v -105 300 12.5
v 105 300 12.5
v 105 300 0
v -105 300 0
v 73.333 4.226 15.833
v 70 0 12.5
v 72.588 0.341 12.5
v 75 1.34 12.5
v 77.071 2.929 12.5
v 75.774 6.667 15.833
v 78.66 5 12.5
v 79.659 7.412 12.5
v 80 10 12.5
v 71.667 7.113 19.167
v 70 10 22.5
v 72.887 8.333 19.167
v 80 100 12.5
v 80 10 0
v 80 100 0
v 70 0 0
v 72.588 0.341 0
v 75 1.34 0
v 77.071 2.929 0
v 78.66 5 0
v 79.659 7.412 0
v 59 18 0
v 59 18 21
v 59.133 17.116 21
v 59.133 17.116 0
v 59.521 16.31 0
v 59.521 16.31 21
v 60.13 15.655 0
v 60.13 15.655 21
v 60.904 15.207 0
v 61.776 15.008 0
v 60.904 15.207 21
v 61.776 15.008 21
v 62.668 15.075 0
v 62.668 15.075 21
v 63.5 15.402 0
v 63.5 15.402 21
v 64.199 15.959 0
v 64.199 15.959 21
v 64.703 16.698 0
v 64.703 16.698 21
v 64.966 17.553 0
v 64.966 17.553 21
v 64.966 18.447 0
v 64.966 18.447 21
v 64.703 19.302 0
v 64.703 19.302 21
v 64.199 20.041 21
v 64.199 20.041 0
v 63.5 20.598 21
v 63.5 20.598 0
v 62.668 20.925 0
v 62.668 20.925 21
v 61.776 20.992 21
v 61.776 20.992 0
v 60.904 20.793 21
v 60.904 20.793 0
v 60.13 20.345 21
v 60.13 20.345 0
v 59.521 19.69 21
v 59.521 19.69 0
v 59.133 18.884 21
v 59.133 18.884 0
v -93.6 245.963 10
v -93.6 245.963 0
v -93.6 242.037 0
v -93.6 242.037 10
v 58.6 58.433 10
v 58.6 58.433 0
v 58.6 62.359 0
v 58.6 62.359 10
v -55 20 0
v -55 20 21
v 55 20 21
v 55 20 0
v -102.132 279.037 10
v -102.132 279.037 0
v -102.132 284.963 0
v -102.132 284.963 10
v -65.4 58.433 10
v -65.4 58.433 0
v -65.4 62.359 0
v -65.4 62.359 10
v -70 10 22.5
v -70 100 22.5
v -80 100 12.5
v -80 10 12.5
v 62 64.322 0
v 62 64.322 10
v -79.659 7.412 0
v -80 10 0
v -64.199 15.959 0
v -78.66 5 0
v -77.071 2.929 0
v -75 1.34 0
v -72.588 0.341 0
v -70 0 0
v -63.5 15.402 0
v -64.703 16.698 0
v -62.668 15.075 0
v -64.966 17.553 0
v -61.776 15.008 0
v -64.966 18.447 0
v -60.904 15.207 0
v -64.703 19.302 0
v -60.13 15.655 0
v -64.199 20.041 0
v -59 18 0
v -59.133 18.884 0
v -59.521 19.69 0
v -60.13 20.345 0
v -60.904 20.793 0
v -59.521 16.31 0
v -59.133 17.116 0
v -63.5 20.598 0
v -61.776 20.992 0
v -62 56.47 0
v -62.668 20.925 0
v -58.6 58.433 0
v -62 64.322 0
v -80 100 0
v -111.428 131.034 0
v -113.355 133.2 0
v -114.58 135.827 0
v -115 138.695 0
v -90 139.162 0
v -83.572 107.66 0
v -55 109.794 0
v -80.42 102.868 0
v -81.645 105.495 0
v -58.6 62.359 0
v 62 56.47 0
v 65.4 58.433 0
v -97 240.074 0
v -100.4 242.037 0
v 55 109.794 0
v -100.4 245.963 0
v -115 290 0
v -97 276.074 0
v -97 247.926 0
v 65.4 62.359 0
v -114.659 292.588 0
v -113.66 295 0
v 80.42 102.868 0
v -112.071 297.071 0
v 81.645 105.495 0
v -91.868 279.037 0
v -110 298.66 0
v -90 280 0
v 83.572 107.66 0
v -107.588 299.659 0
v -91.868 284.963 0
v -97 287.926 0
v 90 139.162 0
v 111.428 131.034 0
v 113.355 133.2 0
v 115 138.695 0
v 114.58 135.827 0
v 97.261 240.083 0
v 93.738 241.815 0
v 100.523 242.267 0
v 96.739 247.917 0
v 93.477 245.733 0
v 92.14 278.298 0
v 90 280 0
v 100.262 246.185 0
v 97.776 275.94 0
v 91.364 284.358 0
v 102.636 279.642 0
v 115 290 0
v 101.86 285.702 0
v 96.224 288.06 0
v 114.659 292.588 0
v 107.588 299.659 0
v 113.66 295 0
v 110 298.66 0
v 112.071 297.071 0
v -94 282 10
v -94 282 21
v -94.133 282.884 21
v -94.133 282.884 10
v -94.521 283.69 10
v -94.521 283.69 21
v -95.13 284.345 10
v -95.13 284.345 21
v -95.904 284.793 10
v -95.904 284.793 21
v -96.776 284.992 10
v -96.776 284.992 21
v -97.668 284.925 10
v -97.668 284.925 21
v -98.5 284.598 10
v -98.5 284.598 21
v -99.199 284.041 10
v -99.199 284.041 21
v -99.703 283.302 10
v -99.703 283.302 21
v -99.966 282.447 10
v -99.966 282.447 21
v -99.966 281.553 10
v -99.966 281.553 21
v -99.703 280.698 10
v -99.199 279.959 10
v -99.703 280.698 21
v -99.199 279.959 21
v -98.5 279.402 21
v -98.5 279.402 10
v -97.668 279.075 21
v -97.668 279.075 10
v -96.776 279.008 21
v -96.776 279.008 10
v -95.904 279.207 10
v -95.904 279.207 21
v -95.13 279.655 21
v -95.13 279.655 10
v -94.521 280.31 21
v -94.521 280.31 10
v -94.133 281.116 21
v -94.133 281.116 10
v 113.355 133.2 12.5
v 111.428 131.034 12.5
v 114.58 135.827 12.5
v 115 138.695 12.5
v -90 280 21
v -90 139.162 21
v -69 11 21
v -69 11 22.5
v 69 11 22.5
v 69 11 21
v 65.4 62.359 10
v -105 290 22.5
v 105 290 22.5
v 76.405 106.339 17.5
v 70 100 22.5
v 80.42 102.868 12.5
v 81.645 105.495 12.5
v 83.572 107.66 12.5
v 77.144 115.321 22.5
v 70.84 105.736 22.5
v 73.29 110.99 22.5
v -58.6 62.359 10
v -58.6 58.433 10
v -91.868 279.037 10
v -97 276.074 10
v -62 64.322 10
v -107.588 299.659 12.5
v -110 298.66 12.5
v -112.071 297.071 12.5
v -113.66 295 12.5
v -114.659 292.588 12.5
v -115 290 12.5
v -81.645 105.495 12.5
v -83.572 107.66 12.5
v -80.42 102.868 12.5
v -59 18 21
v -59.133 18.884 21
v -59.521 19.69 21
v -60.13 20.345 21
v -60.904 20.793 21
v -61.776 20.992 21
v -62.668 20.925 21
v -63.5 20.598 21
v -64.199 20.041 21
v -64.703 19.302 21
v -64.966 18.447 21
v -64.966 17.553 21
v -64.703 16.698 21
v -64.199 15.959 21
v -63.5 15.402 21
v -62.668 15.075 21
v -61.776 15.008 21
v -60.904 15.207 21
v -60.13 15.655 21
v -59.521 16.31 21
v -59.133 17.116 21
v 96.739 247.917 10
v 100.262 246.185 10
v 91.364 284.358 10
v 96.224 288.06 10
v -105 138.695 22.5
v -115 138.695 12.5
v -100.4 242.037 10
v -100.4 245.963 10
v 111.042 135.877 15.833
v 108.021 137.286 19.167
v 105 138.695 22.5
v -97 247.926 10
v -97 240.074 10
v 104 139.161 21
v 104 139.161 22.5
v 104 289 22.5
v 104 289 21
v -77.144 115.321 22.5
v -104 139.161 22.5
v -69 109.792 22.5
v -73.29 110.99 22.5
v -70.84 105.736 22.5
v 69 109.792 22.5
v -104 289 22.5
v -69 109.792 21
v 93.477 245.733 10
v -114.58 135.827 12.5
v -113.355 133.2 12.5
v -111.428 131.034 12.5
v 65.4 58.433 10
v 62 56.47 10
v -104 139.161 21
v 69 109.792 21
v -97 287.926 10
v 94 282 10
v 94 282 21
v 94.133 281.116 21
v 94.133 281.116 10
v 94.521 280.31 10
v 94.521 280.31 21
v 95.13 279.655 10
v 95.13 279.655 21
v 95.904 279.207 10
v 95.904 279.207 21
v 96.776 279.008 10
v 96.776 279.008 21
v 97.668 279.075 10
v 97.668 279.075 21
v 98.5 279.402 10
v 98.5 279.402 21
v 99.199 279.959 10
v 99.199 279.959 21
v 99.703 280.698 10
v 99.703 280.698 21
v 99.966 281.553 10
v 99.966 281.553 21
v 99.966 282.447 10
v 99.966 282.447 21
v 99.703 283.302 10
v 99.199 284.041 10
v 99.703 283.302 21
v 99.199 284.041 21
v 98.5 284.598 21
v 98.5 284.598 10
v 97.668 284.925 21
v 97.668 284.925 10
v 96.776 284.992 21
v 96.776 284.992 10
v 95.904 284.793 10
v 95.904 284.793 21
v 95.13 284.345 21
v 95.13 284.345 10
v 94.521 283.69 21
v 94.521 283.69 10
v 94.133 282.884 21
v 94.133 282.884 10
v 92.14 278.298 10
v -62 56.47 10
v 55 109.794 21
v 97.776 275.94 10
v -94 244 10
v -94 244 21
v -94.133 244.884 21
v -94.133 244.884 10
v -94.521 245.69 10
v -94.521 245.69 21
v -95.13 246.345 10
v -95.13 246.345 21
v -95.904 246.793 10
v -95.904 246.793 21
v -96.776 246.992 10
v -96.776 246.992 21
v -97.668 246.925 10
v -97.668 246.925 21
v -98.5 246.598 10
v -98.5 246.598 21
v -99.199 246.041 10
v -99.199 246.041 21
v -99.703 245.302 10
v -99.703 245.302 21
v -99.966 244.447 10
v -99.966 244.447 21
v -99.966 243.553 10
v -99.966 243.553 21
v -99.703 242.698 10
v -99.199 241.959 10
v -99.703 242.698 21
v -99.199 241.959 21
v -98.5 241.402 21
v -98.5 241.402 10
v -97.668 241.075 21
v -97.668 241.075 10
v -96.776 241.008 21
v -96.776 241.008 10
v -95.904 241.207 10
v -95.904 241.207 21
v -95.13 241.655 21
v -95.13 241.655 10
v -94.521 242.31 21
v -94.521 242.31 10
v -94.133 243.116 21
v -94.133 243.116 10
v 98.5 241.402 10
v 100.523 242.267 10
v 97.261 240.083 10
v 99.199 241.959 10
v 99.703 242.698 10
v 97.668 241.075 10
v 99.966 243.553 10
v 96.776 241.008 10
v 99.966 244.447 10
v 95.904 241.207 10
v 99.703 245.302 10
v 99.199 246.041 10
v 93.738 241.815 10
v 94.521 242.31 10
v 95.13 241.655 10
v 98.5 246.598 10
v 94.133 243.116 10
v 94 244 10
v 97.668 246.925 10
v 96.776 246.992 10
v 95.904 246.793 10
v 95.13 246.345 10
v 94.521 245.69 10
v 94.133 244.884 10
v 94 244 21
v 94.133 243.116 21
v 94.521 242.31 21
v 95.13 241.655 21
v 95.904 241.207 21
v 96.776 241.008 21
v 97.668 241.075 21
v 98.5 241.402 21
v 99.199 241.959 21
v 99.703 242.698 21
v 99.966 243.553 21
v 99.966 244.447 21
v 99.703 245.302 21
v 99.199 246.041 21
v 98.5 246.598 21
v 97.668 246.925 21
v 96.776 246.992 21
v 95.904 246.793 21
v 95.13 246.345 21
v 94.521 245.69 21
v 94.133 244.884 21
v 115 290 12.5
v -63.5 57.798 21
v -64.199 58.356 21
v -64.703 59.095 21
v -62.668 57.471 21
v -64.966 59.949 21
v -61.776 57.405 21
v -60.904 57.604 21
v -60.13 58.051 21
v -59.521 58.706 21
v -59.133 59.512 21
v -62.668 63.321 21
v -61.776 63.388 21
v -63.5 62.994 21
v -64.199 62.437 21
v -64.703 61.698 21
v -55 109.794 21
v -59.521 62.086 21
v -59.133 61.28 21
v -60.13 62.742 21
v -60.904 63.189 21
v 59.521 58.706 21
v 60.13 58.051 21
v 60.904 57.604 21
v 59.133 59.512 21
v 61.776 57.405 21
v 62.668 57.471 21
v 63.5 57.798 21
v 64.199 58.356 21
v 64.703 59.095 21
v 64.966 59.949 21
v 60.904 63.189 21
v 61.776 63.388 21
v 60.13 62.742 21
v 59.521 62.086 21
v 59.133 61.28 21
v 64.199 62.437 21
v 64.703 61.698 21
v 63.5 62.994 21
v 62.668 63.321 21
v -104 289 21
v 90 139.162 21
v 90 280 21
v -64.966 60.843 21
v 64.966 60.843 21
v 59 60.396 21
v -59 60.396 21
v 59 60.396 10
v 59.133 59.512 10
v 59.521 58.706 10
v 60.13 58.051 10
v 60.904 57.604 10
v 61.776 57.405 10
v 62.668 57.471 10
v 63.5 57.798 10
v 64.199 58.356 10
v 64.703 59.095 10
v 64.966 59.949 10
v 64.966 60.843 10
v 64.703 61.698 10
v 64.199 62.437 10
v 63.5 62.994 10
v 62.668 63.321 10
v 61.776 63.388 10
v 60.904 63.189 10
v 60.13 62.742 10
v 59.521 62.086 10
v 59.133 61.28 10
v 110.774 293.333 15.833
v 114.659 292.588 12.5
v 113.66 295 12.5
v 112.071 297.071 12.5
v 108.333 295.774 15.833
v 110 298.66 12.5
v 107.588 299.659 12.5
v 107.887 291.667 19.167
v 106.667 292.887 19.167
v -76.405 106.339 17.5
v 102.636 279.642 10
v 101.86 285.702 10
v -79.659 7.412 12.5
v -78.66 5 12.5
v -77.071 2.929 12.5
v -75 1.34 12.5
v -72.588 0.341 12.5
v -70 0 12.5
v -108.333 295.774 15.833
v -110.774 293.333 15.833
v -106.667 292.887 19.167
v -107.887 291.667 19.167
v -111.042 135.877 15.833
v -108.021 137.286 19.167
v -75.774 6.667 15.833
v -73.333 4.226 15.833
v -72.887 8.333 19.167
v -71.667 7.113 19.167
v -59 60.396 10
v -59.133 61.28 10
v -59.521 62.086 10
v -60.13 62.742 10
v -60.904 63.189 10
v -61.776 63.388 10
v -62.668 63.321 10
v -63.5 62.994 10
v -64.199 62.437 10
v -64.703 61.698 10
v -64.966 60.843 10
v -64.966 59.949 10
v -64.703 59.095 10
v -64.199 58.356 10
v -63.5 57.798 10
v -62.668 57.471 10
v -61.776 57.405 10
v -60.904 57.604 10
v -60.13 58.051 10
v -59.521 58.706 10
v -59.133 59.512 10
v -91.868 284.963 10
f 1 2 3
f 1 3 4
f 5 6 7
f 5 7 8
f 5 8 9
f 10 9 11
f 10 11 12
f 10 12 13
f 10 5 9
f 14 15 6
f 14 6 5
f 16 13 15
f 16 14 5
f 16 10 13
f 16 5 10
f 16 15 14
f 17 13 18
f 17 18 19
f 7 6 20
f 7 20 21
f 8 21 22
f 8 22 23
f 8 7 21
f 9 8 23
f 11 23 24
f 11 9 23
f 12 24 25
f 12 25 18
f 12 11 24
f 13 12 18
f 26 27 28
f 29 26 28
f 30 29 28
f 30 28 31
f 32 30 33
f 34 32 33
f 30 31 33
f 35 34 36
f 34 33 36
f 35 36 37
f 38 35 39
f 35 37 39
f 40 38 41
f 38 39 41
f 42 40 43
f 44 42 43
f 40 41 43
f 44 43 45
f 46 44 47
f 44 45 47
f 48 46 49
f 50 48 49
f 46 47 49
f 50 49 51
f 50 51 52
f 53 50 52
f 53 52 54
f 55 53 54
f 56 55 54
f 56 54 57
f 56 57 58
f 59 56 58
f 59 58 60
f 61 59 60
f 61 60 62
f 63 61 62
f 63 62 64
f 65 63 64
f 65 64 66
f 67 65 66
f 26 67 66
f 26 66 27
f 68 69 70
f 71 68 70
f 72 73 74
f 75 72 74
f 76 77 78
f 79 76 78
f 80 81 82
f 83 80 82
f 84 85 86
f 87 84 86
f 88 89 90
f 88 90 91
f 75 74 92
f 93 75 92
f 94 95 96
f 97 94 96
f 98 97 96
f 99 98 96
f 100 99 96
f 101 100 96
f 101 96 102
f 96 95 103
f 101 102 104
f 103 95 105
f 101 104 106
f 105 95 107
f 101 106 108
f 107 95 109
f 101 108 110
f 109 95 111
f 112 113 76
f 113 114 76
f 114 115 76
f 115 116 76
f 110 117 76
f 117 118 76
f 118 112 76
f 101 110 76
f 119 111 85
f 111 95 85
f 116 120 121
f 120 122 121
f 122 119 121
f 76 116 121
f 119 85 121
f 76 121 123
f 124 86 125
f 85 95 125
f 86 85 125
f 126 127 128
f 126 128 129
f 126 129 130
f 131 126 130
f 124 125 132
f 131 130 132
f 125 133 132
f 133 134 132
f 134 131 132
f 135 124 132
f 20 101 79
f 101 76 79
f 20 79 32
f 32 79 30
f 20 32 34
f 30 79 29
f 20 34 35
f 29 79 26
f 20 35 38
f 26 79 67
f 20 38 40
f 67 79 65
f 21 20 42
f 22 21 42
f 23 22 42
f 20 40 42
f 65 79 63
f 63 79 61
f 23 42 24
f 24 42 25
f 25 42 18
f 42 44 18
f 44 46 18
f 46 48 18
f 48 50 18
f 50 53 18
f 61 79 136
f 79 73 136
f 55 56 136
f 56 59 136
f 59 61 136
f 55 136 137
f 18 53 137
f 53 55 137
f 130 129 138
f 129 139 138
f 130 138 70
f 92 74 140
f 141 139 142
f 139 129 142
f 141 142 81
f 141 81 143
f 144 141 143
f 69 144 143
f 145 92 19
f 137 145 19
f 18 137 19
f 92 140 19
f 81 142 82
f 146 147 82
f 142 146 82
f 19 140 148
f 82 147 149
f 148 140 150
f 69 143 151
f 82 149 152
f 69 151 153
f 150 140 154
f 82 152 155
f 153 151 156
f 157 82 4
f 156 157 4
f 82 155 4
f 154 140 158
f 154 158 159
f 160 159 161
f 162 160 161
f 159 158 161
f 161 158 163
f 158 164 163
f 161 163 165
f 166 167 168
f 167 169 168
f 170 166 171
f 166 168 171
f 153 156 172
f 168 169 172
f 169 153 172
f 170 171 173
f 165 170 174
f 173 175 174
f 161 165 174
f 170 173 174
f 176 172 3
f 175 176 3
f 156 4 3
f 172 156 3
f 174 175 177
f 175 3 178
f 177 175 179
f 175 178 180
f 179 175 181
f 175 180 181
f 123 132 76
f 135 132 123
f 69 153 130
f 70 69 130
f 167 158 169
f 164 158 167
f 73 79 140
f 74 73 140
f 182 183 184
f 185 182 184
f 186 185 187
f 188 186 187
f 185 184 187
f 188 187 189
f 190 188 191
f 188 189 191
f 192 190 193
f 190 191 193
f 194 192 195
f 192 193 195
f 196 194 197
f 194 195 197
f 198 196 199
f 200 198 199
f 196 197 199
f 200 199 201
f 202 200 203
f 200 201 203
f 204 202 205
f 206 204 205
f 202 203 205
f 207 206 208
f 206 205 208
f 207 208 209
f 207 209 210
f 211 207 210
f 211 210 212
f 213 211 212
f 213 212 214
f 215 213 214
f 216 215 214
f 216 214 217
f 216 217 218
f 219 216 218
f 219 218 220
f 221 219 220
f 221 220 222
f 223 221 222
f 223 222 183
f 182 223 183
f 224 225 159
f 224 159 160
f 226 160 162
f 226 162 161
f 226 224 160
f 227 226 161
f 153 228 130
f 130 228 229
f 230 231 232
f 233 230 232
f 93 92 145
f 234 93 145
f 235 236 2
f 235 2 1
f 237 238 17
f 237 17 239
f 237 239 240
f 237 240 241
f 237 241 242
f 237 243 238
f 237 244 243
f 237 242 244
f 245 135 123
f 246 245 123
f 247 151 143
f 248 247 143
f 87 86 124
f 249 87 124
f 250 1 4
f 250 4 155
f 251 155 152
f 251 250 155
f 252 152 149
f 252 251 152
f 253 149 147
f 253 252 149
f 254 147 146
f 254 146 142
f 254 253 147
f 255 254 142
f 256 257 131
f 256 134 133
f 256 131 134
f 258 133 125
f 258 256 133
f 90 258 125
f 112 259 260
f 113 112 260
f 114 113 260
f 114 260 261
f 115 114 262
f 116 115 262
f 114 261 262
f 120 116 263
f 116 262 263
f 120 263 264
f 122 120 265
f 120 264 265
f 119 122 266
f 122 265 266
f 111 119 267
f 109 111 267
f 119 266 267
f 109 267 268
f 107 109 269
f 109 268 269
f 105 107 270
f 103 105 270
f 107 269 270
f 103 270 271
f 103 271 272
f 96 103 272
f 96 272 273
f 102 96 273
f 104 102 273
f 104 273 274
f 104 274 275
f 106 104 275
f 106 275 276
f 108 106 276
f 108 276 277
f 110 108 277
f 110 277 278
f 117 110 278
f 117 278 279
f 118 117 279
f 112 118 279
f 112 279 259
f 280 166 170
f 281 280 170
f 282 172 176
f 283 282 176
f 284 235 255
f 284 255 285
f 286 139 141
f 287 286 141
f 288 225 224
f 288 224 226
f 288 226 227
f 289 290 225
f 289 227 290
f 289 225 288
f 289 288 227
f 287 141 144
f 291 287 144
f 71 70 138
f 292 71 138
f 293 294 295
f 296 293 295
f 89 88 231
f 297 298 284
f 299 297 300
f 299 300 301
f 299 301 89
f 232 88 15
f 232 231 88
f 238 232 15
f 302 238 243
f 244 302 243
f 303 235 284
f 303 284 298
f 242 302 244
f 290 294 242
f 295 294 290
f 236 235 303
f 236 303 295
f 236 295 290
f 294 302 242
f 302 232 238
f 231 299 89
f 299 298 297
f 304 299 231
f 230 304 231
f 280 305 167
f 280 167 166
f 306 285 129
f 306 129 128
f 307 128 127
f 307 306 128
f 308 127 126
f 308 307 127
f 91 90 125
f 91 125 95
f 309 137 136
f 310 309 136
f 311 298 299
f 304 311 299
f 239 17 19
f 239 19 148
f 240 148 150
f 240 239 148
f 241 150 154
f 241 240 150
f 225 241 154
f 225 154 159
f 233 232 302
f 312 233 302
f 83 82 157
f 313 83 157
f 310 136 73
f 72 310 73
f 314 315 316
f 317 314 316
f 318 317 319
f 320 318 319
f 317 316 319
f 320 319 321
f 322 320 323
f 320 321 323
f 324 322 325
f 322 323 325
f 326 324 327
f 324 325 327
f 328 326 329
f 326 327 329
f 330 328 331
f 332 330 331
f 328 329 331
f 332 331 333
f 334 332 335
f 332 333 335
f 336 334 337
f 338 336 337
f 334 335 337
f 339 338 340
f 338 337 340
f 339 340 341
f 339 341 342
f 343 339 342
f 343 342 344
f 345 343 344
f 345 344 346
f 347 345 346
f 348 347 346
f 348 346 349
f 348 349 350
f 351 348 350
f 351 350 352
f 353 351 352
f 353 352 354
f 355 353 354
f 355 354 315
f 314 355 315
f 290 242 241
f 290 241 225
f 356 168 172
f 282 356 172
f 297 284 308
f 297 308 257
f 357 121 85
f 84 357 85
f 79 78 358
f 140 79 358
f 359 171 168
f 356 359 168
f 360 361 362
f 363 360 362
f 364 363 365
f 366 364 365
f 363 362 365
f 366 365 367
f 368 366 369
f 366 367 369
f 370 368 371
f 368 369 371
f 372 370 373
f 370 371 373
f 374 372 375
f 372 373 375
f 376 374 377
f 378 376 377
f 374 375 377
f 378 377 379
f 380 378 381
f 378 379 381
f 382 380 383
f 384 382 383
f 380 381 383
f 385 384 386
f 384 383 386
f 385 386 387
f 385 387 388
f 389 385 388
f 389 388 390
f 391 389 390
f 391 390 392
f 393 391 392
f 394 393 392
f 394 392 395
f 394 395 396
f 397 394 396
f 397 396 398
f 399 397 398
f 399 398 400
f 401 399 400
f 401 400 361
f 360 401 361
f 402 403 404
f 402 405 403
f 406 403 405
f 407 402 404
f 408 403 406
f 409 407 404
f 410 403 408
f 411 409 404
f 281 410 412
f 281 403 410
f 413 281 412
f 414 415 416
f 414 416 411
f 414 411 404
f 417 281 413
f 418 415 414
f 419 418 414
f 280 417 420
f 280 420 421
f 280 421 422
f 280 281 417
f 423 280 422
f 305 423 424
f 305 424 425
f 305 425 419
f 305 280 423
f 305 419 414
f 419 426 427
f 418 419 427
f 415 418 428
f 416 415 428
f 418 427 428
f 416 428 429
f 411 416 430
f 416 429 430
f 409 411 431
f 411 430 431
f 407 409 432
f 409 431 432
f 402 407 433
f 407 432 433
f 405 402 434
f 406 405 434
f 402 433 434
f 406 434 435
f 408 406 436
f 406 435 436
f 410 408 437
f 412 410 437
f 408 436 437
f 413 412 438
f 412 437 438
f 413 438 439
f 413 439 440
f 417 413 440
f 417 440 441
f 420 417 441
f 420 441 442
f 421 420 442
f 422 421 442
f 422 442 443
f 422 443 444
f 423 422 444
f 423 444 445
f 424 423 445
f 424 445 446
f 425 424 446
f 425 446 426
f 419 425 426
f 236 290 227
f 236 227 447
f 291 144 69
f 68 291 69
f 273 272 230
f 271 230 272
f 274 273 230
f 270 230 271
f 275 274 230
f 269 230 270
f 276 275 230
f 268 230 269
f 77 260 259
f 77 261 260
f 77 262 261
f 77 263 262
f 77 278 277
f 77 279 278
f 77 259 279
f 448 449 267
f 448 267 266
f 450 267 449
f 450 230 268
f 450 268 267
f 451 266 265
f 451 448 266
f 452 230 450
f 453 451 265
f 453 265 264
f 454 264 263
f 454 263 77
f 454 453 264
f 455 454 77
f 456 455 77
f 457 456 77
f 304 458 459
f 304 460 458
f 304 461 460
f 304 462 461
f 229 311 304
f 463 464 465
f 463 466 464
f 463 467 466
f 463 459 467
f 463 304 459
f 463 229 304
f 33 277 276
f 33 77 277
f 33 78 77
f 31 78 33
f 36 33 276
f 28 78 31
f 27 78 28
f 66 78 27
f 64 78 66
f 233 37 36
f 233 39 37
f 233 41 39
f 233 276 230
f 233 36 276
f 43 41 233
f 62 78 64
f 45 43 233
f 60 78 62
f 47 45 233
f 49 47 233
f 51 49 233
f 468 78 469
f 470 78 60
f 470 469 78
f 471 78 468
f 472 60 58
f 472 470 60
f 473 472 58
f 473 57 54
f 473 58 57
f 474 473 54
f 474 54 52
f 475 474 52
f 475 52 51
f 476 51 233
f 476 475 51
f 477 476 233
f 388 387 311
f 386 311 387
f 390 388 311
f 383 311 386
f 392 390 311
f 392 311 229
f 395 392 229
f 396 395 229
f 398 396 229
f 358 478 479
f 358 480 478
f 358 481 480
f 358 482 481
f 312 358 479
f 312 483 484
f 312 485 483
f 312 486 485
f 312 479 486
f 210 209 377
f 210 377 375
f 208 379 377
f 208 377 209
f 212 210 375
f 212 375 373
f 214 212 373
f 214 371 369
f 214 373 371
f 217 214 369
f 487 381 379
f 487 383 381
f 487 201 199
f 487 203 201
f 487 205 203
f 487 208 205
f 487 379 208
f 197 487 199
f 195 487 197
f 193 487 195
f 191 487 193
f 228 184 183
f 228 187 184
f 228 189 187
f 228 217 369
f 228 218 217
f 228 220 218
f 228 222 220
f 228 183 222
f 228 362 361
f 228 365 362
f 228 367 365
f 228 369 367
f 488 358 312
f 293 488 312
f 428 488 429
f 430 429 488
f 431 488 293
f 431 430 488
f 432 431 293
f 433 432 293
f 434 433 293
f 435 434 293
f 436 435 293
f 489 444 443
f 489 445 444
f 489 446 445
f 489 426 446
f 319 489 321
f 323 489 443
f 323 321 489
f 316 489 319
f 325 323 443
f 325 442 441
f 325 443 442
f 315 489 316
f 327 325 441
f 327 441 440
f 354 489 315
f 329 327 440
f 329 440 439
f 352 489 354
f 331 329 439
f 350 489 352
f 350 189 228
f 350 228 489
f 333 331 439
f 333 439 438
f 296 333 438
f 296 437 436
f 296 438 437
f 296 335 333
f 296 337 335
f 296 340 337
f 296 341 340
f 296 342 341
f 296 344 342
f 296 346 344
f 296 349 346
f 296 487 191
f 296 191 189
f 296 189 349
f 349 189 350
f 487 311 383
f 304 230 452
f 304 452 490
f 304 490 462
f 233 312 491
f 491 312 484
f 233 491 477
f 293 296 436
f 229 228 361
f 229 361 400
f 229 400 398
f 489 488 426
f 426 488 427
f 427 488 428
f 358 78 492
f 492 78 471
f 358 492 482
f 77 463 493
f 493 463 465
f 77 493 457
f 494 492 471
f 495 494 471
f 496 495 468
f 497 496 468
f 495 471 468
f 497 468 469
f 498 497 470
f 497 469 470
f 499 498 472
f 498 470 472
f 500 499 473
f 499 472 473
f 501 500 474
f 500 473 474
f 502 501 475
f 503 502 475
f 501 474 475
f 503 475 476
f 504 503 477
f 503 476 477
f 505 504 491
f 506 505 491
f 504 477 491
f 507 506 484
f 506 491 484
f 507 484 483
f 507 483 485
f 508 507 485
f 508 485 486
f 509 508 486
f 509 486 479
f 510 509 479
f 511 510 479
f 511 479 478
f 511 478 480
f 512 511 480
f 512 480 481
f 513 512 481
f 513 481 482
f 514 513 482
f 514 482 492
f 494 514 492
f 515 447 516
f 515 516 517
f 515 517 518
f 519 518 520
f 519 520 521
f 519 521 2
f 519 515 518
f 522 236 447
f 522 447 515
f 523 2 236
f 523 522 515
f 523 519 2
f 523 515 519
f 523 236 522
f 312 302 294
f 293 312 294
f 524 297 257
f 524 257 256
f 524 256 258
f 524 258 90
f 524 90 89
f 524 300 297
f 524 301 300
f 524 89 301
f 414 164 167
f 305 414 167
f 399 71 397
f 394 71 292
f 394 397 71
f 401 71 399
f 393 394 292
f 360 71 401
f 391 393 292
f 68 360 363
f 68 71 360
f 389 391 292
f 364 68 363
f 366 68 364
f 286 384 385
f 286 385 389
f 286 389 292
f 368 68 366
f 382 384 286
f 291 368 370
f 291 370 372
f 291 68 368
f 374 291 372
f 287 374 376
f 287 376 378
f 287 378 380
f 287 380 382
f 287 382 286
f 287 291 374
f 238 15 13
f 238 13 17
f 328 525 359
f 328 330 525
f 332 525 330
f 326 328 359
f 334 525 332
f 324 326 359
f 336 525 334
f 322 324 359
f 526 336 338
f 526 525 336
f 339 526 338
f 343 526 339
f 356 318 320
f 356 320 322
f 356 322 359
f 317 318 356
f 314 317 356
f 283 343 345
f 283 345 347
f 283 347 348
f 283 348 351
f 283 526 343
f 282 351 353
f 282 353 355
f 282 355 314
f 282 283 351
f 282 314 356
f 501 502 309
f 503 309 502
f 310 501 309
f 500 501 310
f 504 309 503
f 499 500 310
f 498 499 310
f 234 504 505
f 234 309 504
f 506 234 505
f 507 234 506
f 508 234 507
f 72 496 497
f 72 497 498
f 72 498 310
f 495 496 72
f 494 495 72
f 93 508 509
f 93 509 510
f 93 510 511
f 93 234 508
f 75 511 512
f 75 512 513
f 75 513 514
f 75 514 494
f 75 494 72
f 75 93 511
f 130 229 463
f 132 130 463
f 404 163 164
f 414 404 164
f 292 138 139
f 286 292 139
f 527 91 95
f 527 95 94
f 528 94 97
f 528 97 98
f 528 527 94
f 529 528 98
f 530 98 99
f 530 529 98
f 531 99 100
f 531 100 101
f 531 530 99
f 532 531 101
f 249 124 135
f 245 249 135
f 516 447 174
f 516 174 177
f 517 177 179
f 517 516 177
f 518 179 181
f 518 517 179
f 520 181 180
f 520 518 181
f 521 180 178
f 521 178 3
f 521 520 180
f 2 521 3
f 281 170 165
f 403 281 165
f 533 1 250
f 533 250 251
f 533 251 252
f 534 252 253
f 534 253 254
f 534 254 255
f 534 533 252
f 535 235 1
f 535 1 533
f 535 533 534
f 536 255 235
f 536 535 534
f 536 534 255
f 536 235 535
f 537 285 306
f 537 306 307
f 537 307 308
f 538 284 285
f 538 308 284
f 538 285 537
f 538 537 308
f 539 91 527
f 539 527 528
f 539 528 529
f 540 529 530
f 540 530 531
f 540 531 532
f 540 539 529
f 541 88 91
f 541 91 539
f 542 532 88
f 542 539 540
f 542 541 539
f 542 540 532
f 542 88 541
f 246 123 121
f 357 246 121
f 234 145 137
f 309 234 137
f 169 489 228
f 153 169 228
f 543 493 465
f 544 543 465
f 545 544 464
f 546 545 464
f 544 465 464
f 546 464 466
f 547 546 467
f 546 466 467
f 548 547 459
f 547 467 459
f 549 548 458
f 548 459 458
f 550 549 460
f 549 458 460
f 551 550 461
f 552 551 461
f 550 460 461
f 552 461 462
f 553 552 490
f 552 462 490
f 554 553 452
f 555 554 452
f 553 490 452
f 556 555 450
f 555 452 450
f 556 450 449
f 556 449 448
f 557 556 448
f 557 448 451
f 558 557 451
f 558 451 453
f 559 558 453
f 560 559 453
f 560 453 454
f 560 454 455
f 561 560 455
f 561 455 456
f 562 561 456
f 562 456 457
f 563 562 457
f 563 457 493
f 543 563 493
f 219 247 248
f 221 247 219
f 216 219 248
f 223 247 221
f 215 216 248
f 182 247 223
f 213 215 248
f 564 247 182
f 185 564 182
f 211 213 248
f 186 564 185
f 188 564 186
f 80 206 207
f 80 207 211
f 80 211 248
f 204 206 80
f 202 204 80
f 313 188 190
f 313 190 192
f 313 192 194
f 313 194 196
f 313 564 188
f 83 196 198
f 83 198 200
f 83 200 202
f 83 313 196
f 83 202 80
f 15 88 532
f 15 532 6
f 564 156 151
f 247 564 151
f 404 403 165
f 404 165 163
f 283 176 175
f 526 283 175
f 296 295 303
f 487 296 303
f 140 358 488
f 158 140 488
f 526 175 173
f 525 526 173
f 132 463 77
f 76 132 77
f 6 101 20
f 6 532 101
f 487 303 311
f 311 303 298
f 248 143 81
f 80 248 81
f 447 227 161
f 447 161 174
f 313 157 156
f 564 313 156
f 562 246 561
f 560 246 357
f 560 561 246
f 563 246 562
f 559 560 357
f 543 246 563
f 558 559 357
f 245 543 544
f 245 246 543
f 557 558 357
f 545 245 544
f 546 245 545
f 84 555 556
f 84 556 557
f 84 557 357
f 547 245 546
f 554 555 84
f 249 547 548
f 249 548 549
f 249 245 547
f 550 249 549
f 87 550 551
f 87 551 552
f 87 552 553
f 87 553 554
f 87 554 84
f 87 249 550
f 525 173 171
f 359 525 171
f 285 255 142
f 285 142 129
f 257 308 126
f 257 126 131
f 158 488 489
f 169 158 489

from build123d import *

# Parameters (mm, degrees)
RESSALTO_EXTRUS_O1_DEPTH = 22.5
CHANFRO1_SIZE            = 10
CORTE_EXTRUS_O1_REACH    = 324.073
ESBO_O3_W                = 1139.230904301
ESBO_O3_H                = 709.798033895
CORTE_EXTRUS_O5_DEPTH    = 1.5
ESBO_O5_R                = 3
CORTE_EXTRUS_O6_DEPTH    = 322.972048476
CORTE_EXTRUS_O8_DEPTH    = 10


with BuildPart() as part:
    # Esboço1 → Ressalto-extrusão1 (new, symmetric)
    with BuildSketch(Plane.XY):
        with BuildLine():
            Line((-70, 0), (70, 0))
            ThreePointArc((70, 0), (77.071067812, 2.928932188), (80, 10))
            Line((80, 10), (80, 100))
            ThreePointArc((80, 100), (80.93692213, 104.226182617), (83.572123903, 107.660444431))
            Line((83.572123903, 107.660444431), (111.427876097, 131.034195823))
            ThreePointArc((111.427876097, 131.034195823), (114.06307787, 134.468457637), (115, 138.694640254))
            Line((115, 138.694640254), (115, 290))
            ThreePointArc((115, 290), (112.071067812, 297.071067812), (105, 300))
            Line((105, 300), (-105, 300))
            ThreePointArc((-105, 300), (-112.071067812, 297.071067812), (-115, 290))
            Line((-115, 290), (-115, 138.694640254))
            ThreePointArc((-115, 138.694640254), (-114.06307787, 134.468457637), (-111.427876097, 131.034195823))
            Line((-111.427876097, 131.034195823), (-83.572123903, 107.660444431))
            ThreePointArc((-83.572123903, 107.660444431), (-80.93692213, 104.226182617), (-80, 100))
            Line((-80, 100), (-80, 10))
            ThreePointArc((-80, 10), (-77.071067812, 2.928932188), (-70, 0))
        make_face()
        Polygon((-55, 20), (55, 20), (55, 109.793731589), (90, 139.16221868), (90, 280), (-90, 280), (-90, 139.16221868), (-55, 109.793731589), align=None, mode=Mode.SUBTRACT)
    extrude(amount=RESSALTO_EXTRUS_O1_DEPTH, both=True)

    # Chanfro1
    chanfro1_edges = [part.edges().sort_by_distance(p)[0] for p in [
        (114.06307787, 134.468457637, 22.5),
        (115, 214.347320127, 22.5),
        (115, 214.347320127, -22.5),
        (114.06307787, 134.468457637, -22.5),
        (97.5, 119.347320127, -22.5),
        (80.93692213, 104.226182617, -22.5),
        (80, 55, -22.5),
        (77.071067812, 2.928932188, -22.5),
        (0, 0, -22.5),
        (-77.071067812, 2.928932188, -22.5),
        (-80, 55, -22.5),
        (-80.93692213, 104.226182617, -22.5),
        (-97.5, 119.347320127, -22.5),
        (-114.06307787, 134.468457637, -22.5),
        (-115, 214.347320127, -22.5),
        (-112.071067812, 297.071067812, -22.5),
        (0, 300, -22.5),
        (112.071067812, 297.071067812, -22.5),
        (112.071067812, 297.071067812, 22.5),
        (0, 300, 22.5),
        (-112.071067812, 297.071067812, 22.5),
        (-115, 214.347320127, 22.5),
        (-114.06307787, 134.468457637, 22.5),
        (-97.5, 119.347320127, 22.5),
        (-80.93692213, 104.226182617, 22.5),
        (-80, 55, 22.5),
        (-77.071067812, 2.928932188, 22.5),
        (0, 0, 22.5),
        (77.071067812, 2.928932188, 22.5),
        (80, 55, 22.5),
        (80.93692213, 104.226182617, 22.5),
        (97.5, 119.347320127, 22.5),
    ]]
    chamfer(chanfro1_edges, length=CHANFRO1_SIZE - 0.0001)  # a hair under: the kernel refuses the full size

    # Esboço3 → Corte-extrusão1 (cut, up to next)
    with BuildSketch(Plane.XY, mode=Mode.PRIVATE) as corte_extrus_o1_sk1:
        with Locations((-153.157436203, 152.53565808)):
            Rectangle(ESBO_O3_W, ESBO_O3_H)
    corte_extrus_o1_tool1 = extrude(corte_extrus_o1_sk1.sketch, amount=-CORTE_EXTRUS_O1_REACH, mode=Mode.PRIVATE) & part.part
    add(corte_extrus_o1_tool1.solids().sort_by_distance((-153.157436, 152.535658, 0))[0], mode=Mode.SUBTRACT)

    # Esboço4 → Corte-extrusão5 (cut)
    with BuildSketch(Plane.XY.offset(22.5)):
        Polygon((104, 289), (-104, 289), (-104, 139.160947912), (-69, 109.792460821), (-69, 11), (69, 11), (69, 109.792460821), (104, 139.160947912), align=None)
        Polygon((-90, 280), (-90, 139.16221868), (-55, 109.793731589), (-55, 20), (0, 20), (55, 20), (55, 109.793731589), (90, 139.16221868), (90, 280), align=None, mode=Mode.SUBTRACT)
    extrude(amount=-CORTE_EXTRUS_O5_DEPTH, mode=Mode.SUBTRACT)

    # Esboço5 → Corte-extrusão6 (cut, through all)
    with BuildSketch(Plane.XY.offset(21)):
        with Locations((-97, 244)):
            Circle(ESBO_O5_R)
        with Locations((-62, 60.396230411)):
            Circle(ESBO_O5_R)
        with Locations((-97, 282)):
            Circle(ESBO_O5_R)
        with Locations((-62, 18)):
            Circle(ESBO_O5_R)
        with Locations(Location((62, 18, 0), (0, 0, 180))):
            Circle(ESBO_O5_R)
        with Locations(Location((97, 282, 0), (0, 0, 180))):
            Circle(ESBO_O5_R)
        with Locations(Location((62, 60.396230411, 0), (0, 0, 180))):
            Circle(ESBO_O5_R)
        with Locations(Location((97, 244, 0), (0, 0, 180))):
            Circle(ESBO_O5_R)
    extrude(amount=-CORTE_EXTRUS_O6_DEPTH, mode=Mode.SUBTRACT)

    # Esboço7 → Corte-extrusão8 (cut)
    with BuildSketch(Plane(origin=(0, 0, 0), x_dir=(-1, 0, 0), z_dir=(0, 0, -1))):
        Polygon((-96.223646947, 288.060191195), (-101.860103, 285.702437064), (-102.636456053, 279.642245869), (-97.776353053, 275.939808805), (-92.139897, 278.297562936), (-91.363543947, 284.357754131), align=None)
        Polygon((-96.739022153, 247.917298035), (-100.261990689, 246.184662463), (-100.522968536, 242.267364427), (-97.260977847, 240.082701965), (-93.738009311, 241.815337537), (-93.477031464, 245.732635573), align=None)
        Polygon((-62, 64.322212241), (-65.4, 62.359221326), (-65.4, 58.433239495), (-62, 56.47024858), (-58.6, 58.433239495), (-58.6, 62.359221326), align=None)
        Polygon((-62, 19.92598183), (-63.667949192, 18.962990915), (-63.667949192, 17.037009085), (-62, 16.07401817), (-60.332050808, 17.037009085), (-60.332050808, 18.962990915), align=None)
        Polygon((62.727937948, 19.561318936), (61.011827112, 19.411072223), (60.283889164, 17.849753287), (61.272062052, 16.438681064), (62.988172888, 16.588927777), (63.716110836, 18.150246713), align=None)
        Polygon((62, 64.322212241), (58.6, 62.359221326), (58.6, 58.433239495), (62, 56.47024858), (65.4, 58.433239495), (65.4, 62.359221326), align=None)
        Polygon((97, 247.92598183), (93.6, 245.962990915), (93.6, 242.037009085), (97, 240.07401817), (100.4, 242.037009085), (100.4, 245.962990915), align=None)
        Polygon((97, 287.92598183), (91.867949192, 284.962990915), (91.867949192, 279.037009085), (97, 276.07401817), (102.132050808, 279.037009085), (102.132050808, 284.962990915), align=None)
    extrude(amount=-CORTE_EXTRUS_O8_DEPTH, mode=Mode.SUBTRACT)


solid = part.part
